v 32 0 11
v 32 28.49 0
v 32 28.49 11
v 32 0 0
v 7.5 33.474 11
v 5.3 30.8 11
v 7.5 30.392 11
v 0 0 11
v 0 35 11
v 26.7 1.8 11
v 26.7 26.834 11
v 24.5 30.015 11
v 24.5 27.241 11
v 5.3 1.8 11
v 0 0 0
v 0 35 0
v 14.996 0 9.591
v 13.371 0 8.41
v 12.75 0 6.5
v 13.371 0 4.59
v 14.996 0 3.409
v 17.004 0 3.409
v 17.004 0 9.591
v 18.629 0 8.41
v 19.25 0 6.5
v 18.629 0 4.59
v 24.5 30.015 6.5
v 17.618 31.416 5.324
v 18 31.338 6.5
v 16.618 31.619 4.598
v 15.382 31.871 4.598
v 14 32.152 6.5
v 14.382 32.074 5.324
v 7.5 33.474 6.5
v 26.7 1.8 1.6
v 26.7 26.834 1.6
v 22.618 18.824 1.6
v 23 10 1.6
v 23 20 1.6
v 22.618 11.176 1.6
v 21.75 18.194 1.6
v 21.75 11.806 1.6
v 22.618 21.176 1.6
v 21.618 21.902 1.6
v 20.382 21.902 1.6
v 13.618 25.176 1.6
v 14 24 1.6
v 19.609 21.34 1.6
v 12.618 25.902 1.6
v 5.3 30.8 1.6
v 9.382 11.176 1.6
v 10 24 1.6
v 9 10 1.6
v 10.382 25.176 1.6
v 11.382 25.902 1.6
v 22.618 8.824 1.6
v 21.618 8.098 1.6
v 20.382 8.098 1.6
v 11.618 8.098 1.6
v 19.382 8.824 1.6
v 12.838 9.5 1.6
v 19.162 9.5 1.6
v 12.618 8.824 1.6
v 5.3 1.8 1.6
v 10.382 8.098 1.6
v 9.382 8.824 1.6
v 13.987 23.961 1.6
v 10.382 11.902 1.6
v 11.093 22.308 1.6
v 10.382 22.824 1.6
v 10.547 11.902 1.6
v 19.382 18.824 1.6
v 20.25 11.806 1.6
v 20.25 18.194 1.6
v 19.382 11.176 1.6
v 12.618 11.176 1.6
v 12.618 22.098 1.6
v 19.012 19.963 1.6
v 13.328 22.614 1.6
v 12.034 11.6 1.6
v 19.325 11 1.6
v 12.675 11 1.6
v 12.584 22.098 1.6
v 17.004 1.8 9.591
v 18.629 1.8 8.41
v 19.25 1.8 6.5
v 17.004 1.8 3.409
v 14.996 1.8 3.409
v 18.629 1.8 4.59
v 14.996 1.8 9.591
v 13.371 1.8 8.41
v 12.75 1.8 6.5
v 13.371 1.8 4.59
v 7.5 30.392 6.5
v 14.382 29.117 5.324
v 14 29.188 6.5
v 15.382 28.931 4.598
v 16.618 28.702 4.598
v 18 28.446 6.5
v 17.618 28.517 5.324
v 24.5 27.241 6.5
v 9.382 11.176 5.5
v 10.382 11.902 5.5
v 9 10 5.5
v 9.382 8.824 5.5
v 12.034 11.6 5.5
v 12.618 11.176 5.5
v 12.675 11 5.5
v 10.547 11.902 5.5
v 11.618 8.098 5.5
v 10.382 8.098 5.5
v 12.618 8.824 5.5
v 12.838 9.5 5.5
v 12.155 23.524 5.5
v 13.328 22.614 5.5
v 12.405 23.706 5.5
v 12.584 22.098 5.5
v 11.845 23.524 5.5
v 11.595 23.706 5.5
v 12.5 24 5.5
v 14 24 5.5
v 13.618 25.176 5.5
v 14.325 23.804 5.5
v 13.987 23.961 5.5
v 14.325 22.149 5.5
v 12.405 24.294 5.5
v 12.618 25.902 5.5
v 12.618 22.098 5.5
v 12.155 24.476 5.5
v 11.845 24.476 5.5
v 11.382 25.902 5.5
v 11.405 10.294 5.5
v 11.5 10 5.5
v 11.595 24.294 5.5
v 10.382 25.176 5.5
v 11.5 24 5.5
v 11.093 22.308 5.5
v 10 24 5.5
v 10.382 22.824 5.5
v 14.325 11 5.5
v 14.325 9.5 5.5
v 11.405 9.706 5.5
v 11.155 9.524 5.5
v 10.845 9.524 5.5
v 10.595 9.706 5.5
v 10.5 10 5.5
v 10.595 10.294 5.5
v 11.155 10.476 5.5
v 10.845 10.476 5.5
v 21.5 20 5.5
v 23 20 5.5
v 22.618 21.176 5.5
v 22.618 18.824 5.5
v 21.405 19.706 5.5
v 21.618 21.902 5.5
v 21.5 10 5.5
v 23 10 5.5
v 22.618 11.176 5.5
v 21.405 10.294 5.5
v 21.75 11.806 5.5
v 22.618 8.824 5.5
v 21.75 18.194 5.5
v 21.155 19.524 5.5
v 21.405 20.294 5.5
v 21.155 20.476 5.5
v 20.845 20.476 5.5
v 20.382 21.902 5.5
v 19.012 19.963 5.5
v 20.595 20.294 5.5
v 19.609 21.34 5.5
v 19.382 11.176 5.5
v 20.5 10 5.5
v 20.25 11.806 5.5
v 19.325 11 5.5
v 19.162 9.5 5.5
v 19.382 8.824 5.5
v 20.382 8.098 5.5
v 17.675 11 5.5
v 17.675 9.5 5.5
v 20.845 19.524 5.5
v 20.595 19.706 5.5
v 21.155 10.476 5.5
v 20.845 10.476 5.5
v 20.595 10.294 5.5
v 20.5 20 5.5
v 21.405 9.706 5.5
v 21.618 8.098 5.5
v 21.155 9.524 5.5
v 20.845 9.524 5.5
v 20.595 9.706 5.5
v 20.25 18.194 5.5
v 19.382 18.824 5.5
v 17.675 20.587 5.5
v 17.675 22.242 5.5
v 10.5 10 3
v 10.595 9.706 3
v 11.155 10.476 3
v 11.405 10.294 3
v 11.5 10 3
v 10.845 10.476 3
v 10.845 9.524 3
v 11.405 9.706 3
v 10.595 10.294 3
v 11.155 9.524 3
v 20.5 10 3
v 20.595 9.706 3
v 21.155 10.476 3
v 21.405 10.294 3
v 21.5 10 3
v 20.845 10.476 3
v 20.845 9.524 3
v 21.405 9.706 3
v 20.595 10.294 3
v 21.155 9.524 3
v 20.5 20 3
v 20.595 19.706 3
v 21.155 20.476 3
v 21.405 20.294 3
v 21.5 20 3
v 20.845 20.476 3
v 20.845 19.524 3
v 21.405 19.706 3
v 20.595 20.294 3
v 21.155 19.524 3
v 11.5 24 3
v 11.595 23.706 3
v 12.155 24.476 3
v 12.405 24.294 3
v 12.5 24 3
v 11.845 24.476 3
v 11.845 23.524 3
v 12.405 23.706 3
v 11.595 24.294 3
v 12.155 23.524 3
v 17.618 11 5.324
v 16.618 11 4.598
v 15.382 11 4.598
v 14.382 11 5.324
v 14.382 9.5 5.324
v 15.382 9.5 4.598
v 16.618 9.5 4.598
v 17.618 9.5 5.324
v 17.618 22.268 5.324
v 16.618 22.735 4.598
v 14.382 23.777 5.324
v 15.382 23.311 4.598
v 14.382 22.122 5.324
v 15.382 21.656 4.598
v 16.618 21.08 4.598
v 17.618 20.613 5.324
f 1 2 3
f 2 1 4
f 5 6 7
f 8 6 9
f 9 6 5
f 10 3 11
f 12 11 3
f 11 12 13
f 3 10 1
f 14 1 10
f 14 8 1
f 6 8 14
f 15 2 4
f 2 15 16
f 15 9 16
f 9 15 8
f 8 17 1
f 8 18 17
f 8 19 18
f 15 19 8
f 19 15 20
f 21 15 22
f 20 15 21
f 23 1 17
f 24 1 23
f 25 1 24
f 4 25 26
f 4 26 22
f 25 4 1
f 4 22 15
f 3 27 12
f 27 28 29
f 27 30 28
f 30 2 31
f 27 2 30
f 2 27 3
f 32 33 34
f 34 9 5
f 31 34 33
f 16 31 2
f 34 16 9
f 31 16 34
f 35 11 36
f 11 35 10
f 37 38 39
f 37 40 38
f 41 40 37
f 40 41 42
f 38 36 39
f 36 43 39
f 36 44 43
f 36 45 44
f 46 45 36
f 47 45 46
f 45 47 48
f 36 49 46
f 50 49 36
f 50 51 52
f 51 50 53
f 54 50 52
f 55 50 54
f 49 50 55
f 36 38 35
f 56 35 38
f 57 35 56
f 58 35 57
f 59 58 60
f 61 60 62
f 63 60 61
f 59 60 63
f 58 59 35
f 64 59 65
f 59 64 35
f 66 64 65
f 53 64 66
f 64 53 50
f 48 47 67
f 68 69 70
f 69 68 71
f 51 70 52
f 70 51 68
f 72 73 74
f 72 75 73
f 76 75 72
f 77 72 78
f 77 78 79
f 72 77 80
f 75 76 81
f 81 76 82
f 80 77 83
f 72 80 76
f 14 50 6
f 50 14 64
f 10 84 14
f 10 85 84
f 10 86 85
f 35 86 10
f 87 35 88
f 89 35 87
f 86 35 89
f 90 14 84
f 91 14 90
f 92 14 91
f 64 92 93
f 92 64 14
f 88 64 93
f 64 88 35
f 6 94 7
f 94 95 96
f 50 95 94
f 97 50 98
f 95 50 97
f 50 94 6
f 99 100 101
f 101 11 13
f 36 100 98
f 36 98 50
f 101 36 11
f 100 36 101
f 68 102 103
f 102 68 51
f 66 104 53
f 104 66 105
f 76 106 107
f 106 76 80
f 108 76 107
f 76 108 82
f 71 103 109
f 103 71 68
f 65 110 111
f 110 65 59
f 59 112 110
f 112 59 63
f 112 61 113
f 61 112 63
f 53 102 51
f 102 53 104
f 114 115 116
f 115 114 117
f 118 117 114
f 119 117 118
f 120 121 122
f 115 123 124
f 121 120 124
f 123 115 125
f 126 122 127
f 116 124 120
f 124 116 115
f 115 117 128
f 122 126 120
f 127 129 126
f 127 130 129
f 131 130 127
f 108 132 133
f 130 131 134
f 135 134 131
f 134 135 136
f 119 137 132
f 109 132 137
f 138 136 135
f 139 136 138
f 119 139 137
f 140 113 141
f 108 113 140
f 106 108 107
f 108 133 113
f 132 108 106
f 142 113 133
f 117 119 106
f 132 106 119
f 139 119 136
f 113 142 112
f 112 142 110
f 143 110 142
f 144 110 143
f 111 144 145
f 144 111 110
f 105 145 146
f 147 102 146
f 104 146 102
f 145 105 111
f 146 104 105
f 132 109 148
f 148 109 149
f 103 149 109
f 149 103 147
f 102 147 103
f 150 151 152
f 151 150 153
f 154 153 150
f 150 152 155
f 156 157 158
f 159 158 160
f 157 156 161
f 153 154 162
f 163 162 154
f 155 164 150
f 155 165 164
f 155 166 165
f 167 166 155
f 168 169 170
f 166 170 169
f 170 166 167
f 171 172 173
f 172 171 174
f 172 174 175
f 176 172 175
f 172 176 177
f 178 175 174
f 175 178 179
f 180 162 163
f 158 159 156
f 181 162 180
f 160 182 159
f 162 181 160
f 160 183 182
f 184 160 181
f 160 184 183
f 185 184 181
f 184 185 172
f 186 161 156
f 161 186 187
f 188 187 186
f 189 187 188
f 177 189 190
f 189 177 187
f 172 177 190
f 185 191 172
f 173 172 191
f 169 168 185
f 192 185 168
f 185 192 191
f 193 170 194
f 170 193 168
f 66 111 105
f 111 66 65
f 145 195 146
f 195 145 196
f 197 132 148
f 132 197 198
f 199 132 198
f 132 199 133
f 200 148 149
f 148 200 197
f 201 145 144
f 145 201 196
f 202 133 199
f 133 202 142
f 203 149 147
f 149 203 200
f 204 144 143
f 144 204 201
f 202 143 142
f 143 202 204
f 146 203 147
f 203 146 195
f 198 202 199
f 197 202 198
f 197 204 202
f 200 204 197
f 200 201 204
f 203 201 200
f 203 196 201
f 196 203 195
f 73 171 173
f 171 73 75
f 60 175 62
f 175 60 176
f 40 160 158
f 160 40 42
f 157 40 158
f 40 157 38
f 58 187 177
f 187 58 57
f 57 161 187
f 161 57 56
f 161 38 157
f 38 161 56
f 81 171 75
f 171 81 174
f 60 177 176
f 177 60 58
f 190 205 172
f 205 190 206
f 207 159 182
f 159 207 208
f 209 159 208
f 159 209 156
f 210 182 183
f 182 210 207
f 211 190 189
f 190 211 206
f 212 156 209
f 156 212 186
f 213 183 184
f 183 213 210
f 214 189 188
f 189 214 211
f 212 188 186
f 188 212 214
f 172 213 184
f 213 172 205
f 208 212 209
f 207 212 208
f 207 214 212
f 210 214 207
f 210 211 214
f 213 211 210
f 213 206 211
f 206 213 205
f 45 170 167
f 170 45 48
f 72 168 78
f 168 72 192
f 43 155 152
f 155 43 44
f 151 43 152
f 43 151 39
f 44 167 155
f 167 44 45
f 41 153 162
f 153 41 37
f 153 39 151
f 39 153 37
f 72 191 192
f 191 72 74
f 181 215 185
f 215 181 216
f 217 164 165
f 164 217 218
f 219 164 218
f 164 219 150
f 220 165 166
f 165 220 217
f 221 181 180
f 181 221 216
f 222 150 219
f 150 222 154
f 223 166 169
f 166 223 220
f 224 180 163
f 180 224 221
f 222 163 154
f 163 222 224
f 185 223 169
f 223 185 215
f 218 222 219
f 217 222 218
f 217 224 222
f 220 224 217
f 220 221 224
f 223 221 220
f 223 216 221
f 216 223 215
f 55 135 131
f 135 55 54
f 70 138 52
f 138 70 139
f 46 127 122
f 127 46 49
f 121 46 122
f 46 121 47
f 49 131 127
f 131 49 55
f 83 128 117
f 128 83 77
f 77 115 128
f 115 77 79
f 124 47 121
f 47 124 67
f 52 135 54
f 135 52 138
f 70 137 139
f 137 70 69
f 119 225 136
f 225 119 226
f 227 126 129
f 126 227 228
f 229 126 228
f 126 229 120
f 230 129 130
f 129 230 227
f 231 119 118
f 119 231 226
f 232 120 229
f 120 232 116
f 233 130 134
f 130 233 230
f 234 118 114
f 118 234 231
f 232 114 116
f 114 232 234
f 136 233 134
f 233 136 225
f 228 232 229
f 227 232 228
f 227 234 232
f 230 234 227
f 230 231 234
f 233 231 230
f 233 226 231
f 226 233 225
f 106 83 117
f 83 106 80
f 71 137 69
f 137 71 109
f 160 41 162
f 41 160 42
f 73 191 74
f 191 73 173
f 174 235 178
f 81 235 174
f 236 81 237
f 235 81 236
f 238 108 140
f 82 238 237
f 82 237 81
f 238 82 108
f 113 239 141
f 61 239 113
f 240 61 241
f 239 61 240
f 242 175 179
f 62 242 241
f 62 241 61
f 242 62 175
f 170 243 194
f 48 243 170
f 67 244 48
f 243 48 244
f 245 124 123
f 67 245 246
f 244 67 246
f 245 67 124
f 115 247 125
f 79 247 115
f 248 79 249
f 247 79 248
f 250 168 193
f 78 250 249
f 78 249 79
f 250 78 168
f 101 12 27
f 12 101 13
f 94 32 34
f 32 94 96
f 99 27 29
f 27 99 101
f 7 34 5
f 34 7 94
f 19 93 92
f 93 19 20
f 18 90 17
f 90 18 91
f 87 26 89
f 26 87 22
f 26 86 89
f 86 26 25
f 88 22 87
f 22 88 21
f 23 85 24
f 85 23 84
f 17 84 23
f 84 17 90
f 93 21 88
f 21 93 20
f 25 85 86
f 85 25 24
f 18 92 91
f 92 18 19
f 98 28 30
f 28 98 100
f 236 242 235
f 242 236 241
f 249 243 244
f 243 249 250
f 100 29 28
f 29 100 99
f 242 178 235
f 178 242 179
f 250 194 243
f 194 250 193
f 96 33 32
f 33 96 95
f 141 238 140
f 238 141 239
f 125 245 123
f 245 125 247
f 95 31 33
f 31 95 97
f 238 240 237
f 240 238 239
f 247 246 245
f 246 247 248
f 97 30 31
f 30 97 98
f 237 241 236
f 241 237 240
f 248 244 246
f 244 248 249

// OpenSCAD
$fn = 10;
difference() {
  union() {
    difference() {
      difference() {
        cube([32, 35, 11]);
        translate([0, 35, -5]) rotate([0,0,-11.5]) cube([35, 20, 20]);
      }
      translate([32 / 2 - 21.4 / 2, 1.8, 1.6]) difference() {
        cube([21.4, 29, 11 + 1]);
        translate([0, 29, -5]) rotate([0,0,-10.5]) cube([25, 20, 20]);
      }
    }
    $h = 5.5;
    $d = 4;
    $d2 = 1;
    translate([32 / 2 - 5, 10, 0]) difference() {
      cylinder(h = $h, d = $d);
      translate([0, 0, 3]) cylinder(h = $h, d = $d2);
    }
    translate([32 / 2 + 5, 10, 0]) difference() {
      cylinder(h = $h, d = $d);
      translate([0, 0, 3]) cylinder(h = $h, d = $d2);
    }
    translate([32 / 2 + 5, 10 + 10, 0]) difference() {
      cylinder(h = $h, d = $d);
      translate([0, 0, 3]) cylinder(h = $h, d = $d2);
    }
    translate([32 / 2 - 5 + 1, 10 + 14, 0]) difference() {
      cylinder(h = $h, d = $d);
      translate([0, 0, 3]) cylinder(h = $h, d = $d2);
    }

    translate([32 / 2 - 5.5, 11, 0]) rotate([0,0,-3]) cube([1.5, 12, $h]);
    translate([32 / 2 + 4.25, 11, 0]) cube([1.5, 8, $h]);
    translate([32 / 2 - 4, 9.5, 0]) cube([8, 1.5, $h]);
    translate([32 / 2 - 3.5, 23, 0]) rotate([0,0,-25]) cube([8, 1.5, $h]);
  }
  translate([32 / 2 - 17 / 2, 35 - 10, 5.5 + 1]) cube([17, 20, 1.3 + 5]);
  translate([32 / 2, -5, 6.5]) rotate([-90, 0, 0]) cylinder(d = 6.5, 10);
  translate([32 / 2, -5, 6.5]) rotate([-90, 0, 0]) cylinder(d = 4, h = 45);
}
